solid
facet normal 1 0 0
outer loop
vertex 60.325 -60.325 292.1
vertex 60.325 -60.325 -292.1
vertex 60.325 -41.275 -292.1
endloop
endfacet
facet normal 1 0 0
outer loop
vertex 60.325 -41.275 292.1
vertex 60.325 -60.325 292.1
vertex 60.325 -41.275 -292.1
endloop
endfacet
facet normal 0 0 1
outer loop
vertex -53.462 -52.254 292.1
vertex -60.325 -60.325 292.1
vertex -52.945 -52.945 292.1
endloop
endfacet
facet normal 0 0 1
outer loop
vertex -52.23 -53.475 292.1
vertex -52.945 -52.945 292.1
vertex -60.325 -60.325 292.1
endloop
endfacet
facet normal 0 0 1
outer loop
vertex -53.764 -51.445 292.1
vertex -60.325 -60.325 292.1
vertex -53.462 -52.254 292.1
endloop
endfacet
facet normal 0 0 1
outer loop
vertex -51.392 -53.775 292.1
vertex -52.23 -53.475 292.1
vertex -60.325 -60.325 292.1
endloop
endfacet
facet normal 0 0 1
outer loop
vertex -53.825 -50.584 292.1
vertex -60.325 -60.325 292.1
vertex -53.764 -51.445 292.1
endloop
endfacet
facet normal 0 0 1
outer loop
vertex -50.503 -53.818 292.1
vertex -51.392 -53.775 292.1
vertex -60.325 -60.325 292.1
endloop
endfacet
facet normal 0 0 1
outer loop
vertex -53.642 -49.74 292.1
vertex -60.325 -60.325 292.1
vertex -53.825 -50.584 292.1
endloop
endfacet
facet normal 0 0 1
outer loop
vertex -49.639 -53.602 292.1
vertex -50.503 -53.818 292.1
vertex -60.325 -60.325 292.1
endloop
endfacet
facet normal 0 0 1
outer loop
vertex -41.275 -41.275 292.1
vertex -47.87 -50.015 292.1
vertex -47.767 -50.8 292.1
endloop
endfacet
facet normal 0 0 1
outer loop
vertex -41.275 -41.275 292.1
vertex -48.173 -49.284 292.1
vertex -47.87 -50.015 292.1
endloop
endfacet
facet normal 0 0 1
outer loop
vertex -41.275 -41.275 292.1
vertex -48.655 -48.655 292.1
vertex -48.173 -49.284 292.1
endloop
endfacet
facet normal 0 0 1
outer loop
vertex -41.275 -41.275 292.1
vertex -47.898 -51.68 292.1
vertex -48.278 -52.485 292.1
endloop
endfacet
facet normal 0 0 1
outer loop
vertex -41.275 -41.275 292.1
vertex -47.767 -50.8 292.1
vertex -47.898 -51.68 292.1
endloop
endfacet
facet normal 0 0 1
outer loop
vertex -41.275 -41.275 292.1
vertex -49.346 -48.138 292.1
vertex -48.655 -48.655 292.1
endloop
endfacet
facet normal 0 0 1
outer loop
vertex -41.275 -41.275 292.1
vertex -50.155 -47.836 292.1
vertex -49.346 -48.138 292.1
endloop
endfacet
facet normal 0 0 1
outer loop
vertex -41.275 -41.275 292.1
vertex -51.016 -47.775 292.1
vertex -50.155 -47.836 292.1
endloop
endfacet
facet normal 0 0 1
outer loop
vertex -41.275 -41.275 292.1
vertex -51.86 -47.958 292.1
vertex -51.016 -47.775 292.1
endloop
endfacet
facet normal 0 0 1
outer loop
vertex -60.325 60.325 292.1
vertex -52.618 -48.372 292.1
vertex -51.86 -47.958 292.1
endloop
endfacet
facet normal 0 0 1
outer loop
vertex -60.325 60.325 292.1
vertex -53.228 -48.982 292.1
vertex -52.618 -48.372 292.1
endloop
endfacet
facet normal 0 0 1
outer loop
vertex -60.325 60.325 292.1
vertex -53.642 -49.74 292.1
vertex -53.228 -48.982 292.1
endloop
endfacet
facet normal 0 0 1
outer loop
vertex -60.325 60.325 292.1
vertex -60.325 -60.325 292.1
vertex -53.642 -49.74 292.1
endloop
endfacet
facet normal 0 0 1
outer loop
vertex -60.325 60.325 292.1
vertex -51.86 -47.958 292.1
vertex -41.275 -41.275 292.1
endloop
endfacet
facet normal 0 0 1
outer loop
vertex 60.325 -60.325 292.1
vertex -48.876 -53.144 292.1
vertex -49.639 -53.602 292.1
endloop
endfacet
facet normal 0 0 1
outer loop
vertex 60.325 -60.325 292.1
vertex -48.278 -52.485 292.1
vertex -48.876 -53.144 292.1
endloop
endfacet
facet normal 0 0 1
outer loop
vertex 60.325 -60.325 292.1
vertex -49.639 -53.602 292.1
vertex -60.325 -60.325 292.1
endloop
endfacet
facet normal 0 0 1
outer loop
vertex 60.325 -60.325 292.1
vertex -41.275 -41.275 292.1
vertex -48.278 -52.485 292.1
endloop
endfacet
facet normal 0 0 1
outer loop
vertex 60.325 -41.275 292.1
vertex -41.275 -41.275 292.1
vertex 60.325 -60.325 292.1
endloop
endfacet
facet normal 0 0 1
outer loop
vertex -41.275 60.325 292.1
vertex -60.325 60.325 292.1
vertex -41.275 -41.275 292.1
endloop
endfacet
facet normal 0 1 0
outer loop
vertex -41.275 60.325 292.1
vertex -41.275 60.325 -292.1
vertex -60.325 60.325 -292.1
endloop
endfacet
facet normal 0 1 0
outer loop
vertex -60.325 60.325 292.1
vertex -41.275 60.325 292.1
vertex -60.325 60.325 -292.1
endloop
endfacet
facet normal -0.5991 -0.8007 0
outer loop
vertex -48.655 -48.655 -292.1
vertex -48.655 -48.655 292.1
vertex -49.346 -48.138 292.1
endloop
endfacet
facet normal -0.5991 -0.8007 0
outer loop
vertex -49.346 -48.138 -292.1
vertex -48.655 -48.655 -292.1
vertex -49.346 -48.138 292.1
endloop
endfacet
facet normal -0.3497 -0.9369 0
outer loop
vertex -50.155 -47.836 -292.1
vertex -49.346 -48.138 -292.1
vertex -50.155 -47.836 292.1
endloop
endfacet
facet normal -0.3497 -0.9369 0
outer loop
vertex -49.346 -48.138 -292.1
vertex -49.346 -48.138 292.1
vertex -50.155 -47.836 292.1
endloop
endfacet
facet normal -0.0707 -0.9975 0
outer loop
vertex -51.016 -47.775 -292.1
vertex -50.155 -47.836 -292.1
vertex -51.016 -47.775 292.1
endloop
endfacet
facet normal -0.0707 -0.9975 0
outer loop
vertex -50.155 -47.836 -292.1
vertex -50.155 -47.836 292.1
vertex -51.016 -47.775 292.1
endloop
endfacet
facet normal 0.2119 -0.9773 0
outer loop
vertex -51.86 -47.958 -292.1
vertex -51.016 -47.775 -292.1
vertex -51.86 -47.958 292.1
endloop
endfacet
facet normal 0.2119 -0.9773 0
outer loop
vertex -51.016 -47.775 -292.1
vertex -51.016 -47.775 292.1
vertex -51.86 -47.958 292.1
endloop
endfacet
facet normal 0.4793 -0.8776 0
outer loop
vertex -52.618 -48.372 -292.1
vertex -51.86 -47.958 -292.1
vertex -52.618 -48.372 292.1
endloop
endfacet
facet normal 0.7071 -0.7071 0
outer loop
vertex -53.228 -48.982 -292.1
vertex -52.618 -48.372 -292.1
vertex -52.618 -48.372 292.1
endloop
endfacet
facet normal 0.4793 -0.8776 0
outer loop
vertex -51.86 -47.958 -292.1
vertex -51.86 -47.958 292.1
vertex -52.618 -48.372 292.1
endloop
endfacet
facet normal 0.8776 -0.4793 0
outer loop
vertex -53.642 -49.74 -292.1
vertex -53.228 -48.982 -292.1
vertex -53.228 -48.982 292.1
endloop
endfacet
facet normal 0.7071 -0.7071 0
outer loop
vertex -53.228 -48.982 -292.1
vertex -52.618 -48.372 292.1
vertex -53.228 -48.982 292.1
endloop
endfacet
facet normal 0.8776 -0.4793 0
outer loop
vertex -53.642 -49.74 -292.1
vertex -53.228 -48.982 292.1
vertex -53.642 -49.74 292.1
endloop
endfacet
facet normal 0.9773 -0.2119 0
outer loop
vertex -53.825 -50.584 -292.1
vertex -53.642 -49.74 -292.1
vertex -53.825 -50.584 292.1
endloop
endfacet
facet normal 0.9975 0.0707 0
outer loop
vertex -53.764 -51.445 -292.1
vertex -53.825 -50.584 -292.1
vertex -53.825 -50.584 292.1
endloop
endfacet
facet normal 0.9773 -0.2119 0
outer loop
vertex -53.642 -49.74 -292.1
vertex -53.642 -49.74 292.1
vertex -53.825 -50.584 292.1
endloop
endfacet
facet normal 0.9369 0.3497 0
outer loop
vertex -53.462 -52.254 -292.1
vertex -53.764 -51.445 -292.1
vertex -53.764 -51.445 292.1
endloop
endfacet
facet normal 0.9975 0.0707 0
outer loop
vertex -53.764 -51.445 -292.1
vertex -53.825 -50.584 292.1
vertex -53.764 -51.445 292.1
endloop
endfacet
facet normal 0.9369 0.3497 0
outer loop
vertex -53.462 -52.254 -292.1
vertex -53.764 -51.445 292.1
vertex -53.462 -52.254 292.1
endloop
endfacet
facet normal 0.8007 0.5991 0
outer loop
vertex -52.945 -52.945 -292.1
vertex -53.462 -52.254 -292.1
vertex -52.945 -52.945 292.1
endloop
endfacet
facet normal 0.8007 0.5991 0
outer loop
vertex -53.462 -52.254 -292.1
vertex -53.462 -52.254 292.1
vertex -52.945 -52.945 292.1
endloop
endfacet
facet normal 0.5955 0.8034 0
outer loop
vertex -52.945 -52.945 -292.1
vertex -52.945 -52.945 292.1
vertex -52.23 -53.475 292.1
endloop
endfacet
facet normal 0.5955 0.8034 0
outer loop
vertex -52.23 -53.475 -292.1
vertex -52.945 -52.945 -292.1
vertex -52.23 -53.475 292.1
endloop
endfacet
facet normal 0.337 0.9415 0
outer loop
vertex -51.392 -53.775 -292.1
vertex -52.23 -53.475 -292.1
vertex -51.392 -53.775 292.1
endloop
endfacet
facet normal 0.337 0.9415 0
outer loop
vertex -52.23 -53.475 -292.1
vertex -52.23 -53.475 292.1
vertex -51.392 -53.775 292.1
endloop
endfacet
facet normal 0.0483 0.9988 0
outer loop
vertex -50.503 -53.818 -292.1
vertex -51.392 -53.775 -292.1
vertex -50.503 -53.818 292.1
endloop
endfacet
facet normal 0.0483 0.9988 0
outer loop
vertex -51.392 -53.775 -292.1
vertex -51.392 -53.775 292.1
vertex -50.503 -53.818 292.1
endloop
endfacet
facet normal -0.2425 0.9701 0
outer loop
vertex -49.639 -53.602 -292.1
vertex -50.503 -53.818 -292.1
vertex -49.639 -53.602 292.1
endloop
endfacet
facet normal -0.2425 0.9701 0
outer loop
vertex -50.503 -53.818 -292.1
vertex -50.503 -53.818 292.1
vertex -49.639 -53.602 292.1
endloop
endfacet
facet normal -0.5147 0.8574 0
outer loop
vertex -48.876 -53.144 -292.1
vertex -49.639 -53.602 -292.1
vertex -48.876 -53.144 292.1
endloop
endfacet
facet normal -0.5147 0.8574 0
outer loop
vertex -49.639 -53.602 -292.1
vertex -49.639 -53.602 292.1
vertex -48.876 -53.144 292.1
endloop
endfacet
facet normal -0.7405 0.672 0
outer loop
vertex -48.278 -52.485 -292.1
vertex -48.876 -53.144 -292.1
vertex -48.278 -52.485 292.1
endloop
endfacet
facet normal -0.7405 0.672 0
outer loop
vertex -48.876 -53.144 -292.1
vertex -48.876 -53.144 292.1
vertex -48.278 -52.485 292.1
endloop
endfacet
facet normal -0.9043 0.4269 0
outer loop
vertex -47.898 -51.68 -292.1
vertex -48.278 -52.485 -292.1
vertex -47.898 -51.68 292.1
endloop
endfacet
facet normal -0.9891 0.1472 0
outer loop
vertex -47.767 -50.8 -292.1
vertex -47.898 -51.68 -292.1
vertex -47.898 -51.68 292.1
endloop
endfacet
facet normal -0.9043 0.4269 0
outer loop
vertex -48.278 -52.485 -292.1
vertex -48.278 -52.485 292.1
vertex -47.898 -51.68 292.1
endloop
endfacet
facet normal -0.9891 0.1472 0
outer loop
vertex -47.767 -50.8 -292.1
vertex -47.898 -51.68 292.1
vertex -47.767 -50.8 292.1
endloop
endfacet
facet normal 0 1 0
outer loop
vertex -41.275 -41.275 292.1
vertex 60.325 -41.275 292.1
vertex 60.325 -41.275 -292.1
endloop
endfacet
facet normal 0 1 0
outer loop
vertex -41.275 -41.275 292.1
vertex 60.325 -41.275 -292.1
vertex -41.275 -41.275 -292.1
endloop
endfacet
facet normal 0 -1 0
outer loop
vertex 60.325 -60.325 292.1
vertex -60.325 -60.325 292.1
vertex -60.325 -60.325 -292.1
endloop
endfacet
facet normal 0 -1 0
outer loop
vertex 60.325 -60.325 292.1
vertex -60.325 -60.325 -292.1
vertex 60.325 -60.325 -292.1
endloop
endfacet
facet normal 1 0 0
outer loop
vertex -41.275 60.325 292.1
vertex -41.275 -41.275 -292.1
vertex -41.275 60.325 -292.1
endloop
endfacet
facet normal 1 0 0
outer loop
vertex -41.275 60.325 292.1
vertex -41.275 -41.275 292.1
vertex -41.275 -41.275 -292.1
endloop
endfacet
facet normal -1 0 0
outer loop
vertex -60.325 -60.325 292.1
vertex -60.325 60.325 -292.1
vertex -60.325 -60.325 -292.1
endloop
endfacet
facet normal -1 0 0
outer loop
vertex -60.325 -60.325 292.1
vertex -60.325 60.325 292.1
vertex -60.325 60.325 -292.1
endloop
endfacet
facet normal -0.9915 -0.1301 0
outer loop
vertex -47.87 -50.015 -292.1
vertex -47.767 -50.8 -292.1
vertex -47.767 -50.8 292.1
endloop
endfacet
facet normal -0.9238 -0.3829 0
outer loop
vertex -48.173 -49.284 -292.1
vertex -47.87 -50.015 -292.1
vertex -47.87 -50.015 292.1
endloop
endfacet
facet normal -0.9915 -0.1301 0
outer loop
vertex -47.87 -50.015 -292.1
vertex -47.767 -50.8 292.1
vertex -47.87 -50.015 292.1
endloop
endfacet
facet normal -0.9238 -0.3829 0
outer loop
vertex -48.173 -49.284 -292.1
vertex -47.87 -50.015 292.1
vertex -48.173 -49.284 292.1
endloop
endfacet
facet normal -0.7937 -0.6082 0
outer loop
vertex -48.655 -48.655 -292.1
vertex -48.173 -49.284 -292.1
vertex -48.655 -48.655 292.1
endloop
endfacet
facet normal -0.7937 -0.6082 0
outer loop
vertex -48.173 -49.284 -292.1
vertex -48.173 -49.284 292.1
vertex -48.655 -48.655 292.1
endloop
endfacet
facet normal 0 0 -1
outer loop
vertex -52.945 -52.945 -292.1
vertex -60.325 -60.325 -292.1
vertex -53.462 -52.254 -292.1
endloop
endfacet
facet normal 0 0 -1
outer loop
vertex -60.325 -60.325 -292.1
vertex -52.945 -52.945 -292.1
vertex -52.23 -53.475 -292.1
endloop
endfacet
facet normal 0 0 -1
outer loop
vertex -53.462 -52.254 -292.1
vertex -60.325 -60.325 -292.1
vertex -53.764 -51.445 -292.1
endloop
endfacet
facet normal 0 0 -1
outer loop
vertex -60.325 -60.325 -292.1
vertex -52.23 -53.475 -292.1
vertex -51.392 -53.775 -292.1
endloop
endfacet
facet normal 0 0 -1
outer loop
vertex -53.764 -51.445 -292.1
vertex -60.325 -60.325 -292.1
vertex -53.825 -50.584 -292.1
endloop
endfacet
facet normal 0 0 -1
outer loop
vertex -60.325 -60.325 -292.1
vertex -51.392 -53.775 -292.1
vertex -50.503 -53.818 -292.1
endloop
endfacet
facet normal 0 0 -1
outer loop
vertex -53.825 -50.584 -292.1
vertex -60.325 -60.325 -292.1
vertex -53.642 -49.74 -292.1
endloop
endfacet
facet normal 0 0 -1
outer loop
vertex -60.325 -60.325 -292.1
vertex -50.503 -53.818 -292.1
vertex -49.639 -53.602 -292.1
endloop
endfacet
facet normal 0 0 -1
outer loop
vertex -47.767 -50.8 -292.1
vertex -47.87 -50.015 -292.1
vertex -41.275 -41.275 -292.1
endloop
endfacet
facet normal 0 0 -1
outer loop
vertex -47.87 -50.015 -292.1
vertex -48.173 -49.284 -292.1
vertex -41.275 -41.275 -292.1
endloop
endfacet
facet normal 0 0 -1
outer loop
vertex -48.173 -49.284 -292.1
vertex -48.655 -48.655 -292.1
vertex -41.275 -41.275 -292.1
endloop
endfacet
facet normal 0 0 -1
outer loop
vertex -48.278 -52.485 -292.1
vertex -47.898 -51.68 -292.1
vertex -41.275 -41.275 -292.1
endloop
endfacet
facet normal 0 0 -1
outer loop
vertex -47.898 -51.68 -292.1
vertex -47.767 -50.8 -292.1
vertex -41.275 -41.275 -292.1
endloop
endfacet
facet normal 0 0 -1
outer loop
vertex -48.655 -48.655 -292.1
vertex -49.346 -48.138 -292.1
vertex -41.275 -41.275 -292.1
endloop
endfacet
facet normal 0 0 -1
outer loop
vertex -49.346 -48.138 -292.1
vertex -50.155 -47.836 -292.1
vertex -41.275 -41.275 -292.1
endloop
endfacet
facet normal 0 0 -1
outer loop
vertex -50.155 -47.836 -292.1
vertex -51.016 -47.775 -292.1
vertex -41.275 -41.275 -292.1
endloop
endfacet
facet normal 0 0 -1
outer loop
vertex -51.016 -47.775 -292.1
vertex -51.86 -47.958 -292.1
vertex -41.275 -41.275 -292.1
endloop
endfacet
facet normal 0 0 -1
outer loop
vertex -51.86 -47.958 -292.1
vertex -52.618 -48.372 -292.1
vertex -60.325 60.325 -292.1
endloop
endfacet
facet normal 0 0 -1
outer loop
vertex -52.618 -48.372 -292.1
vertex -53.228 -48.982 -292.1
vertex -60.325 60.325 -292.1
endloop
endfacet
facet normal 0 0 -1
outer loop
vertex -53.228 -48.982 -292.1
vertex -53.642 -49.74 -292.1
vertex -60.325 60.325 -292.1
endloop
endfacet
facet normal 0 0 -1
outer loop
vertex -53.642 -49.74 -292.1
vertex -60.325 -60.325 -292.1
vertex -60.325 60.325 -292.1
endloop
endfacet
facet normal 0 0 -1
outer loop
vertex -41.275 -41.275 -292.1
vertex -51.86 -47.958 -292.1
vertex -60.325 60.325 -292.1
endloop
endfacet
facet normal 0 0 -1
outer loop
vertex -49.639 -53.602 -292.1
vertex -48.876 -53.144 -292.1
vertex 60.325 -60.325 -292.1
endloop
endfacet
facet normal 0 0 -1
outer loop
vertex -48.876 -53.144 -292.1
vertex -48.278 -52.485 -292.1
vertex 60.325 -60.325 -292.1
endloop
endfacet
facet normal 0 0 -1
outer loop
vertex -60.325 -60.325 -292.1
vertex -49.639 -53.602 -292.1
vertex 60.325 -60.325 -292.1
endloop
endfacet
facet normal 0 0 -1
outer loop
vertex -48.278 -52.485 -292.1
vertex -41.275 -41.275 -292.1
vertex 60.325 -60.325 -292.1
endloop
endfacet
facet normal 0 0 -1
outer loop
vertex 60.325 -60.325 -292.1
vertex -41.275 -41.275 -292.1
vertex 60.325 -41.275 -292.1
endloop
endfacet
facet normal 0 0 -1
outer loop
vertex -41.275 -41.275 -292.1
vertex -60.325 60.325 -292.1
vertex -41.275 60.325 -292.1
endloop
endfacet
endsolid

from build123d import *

# Parameters (mm, degrees)
F1_DEPTH = 292.1
F3_DEPTH = 611.632


with BuildPart() as f1:
    # F0 (on Top) → F1 (new body, symmetric)
    with BuildSketch(Plane.XY):
        Polygon((-60.325, 60.325), (-60.325, -60.325), (60.325, -60.325), (60.325, -41.275), (-41.275, -41.275), (-41.275, 60.325), align=None)
    extrude(amount=F1_DEPTH, both=True)

    # F2 (on face) → F3 (cut)
    with BuildSketch(Plane.XY.offset(292.1)):
        with BuildLine():
            ThreePointArc((-47.767103, -50.8), (-47.997968, -49.63936), (-48.655418, -48.655418))
            Line((-48.655418, -48.655418), (-52.944582, -52.944582))
            ThreePointArc((-52.944582, -52.944582), (-49.63936, -53.602032), (-47.767103, -50.8))
        make_face()
        with BuildLine():
            Line((-52.944582, -52.944582), (-48.655418, -48.655418))
            ThreePointArc((-48.655418, -48.655418), (-52.944582, -48.655418), (-52.944582, -52.944582))
        make_face()
    extrude(amount=-F3_DEPTH, mode=Mode.SUBTRACT)


solid = f1.part
